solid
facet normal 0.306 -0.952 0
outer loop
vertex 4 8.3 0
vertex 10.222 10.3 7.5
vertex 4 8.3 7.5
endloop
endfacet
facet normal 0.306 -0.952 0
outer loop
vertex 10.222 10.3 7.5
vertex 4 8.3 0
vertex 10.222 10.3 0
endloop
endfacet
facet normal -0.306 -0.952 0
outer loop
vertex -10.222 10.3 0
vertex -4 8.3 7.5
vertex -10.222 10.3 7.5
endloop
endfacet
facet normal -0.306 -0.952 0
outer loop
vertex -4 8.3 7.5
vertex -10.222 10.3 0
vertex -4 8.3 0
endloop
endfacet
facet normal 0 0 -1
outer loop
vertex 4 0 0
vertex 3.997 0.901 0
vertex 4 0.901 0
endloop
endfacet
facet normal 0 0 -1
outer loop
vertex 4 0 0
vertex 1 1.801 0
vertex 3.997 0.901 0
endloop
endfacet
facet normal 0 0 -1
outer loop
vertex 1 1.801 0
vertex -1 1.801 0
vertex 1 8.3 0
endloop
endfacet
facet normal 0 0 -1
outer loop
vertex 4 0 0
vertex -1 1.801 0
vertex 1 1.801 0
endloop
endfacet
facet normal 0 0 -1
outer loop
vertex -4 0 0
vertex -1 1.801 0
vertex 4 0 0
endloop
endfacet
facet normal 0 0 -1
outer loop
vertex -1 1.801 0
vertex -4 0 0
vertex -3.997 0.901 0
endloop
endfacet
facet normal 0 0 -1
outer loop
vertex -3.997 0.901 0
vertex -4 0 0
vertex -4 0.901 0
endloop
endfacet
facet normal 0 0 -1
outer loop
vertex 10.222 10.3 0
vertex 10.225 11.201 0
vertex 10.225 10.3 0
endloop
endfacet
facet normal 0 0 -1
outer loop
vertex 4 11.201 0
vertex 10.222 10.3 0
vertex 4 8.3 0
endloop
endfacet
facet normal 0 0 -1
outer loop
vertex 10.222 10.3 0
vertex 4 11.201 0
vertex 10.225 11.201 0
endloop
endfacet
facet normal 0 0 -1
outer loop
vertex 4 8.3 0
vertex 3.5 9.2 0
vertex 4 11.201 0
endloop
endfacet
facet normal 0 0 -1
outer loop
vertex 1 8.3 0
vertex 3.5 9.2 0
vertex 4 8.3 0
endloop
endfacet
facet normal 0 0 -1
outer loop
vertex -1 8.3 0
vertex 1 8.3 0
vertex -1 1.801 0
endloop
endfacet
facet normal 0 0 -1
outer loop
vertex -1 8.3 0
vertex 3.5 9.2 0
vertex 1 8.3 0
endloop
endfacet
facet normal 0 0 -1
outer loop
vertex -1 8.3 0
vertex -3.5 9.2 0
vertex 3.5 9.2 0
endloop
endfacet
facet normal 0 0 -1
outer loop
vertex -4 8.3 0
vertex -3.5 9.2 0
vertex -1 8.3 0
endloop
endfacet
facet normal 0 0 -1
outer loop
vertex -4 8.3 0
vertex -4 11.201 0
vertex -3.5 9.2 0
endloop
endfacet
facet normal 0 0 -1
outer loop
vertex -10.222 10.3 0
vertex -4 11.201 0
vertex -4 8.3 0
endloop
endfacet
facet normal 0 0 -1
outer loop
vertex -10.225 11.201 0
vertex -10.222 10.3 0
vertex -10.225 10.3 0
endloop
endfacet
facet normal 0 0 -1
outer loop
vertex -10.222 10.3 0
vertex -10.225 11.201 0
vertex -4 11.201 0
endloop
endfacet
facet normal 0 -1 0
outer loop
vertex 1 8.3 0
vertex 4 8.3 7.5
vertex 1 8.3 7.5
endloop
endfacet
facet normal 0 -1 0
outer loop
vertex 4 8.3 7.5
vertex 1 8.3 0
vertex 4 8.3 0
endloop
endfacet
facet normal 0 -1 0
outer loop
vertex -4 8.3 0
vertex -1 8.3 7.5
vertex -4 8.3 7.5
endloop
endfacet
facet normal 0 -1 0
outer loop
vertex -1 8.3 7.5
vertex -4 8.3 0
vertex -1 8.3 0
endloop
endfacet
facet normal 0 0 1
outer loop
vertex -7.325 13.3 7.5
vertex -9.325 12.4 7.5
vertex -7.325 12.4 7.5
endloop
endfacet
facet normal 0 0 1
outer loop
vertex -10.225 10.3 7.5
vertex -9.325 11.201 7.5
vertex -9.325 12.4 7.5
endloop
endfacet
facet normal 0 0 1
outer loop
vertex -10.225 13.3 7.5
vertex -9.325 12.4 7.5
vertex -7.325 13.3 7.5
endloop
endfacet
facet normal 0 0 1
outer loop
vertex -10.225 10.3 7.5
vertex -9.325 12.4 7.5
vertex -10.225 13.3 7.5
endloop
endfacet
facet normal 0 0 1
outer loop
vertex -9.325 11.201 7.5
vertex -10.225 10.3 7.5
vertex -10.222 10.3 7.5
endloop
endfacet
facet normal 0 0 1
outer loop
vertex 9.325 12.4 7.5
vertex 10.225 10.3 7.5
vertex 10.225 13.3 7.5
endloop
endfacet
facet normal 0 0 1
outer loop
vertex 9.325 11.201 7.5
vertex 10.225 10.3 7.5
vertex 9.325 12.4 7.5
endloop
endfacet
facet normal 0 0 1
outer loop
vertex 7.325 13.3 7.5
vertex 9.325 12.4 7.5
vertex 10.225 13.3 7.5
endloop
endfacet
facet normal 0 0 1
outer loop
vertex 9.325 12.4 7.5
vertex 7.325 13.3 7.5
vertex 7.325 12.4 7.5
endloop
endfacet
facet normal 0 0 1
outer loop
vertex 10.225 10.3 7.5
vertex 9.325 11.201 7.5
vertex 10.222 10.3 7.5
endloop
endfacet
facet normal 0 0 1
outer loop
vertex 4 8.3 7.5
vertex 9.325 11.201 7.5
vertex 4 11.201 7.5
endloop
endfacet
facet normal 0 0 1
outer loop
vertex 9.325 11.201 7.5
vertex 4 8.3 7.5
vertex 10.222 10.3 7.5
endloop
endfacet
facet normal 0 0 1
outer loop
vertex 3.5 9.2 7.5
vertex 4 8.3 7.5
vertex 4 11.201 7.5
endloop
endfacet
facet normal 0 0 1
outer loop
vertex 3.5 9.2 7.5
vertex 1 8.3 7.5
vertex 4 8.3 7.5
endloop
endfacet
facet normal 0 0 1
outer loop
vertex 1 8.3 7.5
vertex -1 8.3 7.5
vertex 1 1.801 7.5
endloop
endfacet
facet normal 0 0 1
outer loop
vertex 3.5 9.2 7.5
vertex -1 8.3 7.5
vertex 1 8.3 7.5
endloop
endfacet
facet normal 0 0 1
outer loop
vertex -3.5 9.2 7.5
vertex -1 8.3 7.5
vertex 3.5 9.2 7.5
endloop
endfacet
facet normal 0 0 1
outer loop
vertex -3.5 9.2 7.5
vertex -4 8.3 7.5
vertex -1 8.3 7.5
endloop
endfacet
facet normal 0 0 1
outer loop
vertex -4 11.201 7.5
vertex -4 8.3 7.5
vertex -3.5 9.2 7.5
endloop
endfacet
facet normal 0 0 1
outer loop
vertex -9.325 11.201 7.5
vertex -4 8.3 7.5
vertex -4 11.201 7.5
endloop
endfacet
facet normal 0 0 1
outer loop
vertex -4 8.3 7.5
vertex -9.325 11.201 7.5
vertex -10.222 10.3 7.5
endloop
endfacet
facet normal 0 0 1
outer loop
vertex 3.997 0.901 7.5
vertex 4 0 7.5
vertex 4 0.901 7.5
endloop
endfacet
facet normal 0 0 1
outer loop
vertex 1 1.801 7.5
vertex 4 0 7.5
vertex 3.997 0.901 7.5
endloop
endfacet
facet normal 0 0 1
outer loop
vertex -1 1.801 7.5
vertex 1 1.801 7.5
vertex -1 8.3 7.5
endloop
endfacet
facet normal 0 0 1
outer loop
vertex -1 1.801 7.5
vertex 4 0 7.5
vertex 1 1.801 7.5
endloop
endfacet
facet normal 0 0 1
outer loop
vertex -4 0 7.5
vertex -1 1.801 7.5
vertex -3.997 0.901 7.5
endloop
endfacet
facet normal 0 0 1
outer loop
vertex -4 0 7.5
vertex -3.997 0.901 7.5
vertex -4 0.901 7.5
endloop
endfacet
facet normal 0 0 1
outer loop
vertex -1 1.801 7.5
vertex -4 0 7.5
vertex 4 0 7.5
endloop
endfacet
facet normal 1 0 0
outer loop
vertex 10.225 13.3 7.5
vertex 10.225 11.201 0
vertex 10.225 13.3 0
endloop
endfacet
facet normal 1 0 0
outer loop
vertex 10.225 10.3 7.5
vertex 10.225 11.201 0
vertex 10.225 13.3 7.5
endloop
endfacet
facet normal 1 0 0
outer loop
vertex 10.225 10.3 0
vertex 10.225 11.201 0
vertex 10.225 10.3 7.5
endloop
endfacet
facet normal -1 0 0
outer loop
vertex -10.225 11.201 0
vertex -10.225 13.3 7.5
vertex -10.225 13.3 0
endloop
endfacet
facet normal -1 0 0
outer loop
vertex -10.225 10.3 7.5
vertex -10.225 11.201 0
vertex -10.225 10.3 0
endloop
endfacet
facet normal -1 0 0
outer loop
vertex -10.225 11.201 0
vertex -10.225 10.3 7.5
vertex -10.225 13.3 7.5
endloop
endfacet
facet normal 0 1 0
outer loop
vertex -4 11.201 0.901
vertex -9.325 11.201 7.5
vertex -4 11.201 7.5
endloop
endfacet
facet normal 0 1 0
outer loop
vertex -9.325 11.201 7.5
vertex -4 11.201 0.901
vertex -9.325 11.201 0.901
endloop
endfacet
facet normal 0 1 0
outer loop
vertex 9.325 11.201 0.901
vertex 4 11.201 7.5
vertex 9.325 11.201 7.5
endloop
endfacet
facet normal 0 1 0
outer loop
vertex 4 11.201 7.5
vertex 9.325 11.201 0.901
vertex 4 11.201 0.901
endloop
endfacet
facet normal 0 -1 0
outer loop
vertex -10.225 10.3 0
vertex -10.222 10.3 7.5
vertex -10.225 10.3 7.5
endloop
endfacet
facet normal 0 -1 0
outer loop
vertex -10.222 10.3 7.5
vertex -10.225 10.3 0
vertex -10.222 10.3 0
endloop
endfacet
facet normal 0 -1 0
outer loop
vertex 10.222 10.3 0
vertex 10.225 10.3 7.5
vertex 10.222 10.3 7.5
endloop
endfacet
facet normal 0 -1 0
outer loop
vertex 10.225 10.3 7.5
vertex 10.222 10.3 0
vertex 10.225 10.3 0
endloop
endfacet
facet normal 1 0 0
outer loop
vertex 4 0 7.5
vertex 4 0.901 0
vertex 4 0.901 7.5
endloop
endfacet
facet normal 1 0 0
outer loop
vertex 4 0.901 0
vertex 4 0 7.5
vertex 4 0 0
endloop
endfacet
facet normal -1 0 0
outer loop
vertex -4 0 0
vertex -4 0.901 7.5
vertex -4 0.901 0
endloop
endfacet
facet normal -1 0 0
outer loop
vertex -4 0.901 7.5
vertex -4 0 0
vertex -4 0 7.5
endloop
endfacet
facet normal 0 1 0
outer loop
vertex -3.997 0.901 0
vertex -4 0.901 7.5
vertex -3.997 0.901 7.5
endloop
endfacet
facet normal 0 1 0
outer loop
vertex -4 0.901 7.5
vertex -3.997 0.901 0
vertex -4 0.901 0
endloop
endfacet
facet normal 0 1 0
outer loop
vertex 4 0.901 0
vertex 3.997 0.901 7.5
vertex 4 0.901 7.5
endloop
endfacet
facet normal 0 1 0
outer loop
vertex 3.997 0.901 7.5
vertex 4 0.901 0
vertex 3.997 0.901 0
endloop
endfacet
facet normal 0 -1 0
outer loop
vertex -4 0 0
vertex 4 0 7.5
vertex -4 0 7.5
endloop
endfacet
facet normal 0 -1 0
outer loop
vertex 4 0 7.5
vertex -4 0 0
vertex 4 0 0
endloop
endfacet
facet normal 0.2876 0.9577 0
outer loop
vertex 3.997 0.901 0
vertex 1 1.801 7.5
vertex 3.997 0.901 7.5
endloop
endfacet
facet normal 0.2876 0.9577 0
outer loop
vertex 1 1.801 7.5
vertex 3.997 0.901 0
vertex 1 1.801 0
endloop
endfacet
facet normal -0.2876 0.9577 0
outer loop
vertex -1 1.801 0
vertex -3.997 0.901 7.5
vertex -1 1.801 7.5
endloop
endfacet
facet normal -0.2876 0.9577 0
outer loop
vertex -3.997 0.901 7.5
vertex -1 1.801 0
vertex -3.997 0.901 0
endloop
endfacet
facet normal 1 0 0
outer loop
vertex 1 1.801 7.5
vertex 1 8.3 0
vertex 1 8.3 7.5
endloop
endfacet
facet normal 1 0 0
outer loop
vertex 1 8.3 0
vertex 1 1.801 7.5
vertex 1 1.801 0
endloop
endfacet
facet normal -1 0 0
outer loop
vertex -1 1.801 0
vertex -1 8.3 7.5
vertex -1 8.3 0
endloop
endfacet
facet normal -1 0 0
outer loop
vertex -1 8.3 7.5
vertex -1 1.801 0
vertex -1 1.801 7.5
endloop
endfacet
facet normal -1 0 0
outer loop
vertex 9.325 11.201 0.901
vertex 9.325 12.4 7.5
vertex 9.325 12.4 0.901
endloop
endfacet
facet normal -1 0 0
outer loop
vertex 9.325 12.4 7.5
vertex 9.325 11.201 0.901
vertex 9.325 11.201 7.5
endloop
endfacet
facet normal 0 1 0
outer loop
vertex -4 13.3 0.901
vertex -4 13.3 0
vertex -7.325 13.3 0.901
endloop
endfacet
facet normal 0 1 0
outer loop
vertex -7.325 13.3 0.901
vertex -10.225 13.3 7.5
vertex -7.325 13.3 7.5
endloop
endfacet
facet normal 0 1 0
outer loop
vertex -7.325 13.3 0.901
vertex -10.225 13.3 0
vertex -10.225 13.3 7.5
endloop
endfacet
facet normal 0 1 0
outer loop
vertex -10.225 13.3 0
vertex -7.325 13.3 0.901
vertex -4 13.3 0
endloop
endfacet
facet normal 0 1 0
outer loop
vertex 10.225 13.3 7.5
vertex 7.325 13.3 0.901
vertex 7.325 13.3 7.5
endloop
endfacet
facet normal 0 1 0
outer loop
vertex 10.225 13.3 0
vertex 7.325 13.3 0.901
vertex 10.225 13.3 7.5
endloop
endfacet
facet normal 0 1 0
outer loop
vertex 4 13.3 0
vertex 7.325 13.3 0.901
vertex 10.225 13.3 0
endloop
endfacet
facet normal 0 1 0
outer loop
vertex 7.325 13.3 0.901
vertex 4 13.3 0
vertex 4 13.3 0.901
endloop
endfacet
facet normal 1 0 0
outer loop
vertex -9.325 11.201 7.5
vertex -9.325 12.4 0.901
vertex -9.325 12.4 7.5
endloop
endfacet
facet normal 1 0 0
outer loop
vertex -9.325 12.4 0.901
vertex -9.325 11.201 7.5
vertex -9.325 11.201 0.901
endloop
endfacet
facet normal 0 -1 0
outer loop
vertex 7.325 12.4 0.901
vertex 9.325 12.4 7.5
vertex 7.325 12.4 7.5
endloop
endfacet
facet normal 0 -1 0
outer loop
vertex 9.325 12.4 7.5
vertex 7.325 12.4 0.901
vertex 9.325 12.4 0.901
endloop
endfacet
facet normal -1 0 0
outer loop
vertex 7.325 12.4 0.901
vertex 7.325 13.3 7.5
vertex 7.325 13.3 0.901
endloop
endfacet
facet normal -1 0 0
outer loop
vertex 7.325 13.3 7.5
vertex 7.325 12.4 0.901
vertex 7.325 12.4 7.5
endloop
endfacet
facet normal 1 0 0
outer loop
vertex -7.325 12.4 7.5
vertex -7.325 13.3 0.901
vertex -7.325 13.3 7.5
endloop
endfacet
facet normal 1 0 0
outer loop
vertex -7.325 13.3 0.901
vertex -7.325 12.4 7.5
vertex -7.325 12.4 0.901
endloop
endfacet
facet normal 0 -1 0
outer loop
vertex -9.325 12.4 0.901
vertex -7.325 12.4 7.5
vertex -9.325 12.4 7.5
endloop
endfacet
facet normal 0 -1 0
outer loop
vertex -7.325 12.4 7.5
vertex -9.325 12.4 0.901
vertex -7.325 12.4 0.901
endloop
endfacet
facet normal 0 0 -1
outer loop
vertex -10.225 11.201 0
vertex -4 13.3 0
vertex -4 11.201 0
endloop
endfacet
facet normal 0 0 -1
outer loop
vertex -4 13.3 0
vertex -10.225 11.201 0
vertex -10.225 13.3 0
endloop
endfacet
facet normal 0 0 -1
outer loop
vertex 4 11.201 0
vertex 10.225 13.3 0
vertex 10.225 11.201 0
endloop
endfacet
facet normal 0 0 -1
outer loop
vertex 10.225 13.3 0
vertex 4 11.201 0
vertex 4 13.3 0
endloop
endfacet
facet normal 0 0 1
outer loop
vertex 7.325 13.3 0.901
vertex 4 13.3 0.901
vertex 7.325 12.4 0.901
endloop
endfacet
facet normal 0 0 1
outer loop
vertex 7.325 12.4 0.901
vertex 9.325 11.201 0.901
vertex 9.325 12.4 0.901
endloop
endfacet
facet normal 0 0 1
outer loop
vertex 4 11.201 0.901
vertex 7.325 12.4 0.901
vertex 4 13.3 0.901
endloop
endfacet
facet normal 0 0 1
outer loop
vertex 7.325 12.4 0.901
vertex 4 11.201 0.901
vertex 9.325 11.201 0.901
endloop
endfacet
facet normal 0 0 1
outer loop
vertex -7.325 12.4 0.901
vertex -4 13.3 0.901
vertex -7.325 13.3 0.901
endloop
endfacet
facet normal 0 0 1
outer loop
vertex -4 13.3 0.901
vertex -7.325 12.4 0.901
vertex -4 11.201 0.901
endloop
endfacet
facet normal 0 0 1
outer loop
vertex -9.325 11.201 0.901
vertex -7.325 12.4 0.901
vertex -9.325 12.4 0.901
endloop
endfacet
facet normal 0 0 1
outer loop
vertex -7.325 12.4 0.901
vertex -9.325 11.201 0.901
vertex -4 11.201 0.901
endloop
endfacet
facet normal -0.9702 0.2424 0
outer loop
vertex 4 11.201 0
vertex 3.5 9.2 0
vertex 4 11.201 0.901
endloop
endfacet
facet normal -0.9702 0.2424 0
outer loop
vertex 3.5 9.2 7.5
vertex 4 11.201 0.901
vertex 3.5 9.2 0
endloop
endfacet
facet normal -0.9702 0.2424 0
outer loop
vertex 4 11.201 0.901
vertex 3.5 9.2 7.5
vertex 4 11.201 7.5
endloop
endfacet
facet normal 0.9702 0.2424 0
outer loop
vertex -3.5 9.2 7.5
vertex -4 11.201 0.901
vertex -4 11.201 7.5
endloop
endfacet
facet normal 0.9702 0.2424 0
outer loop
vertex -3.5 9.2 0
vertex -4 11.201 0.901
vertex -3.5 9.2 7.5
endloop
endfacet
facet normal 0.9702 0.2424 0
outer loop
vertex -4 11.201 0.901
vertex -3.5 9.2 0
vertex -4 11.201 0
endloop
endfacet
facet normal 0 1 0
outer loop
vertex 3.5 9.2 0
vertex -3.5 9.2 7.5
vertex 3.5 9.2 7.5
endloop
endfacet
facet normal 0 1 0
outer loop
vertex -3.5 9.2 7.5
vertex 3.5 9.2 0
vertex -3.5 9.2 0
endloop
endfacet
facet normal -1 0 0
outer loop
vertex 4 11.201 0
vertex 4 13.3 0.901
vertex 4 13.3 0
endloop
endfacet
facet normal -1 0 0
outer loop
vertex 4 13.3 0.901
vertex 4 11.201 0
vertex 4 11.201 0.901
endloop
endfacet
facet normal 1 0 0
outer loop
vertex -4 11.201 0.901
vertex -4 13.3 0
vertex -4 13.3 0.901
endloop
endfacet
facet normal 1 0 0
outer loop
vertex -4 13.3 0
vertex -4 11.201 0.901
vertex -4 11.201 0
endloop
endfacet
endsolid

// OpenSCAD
overlap = 0.001;

depth = 7.5;
thickness = 0.9;
innerDepth = depth - thickness;

// Space allowed for the rf board
board_width = 18.65;
board_height = 1.2;
// Space allowed for plug on the rf board
plug_opening_width_top = 8;
plug_opening_width_bottom = 7;
plug_opening_height = 2;
// Part enclosing top of rf board
board_top_width = 2;
board_top_height = thickness;

// Total height of base from bottom of rf board to ground
base_height = 11.2;

// Top of the base below the rf board
base_top_height_outside = thickness;
base_top_height_inside = plug_opening_height + thickness;
base_top_width_top = board_width + 2 * thickness;
base_top_width_bottom = 8;

// Bottom of the base on the ground
base_bottom_height_outside = thickness;
base_bottom_height_inside = thickness * 2;
base_bottom_width_bottom = 8;
base_bottom_width_top = 2;

module trapezoid(a, b, h, d) {
    linear_extrude(d, convexity = 2)
        polygon([
            [-b / 2, 0],
            [b / 2, 0],
            [a / 2, h],
            [-a / 2, h]
        ]);
}


translate([0, 0, depth])
mirror([0, 0, 1])
difference() {
    union() {
        // Base bottom
        translate([-base_bottom_width_bottom / 2, 0])
            cube([base_bottom_width_bottom, base_bottom_height_outside + overlap, depth]);
        translate([0, base_bottom_height_outside])
            trapezoid(
                base_bottom_width_top,
                base_bottom_width_bottom,
                base_bottom_height_inside - base_bottom_height_outside + overlap,
                depth
            );
        // Base middle
        translate([-base_bottom_width_top / 2, base_bottom_height_inside])
            cube([base_bottom_width_top, base_height - base_bottom_height_inside - base_top_height_inside + overlap, depth]);
        // Base top
        union() {
            translate([0, base_height - base_top_height_outside + overlap])
                mirror([0, 1, 0]) // top edge on origin
                trapezoid(
                    base_top_width_bottom,
                    base_top_width_top,
                    base_top_height_inside - base_top_height_outside + overlap,
                    depth
                );
            translate([-base_top_width_top / 2, base_height + overlap])
                mirror([0, 1, 0]) // top edge on origin
                cube([base_top_width_top, base_top_height_outside + overlap, depth]);
        }
        // Rf board sides
        translate([board_width / 2, base_height])
            cube([(base_top_width_top - board_width) / 2, board_height + board_top_height, innerDepth]);
        translate([-board_width / 2, base_height])
            mirror([1, 0, 0]) // right edge on origin
            cube([(base_top_width_top - board_width) / 2, board_height + board_top_height, innerDepth]);
        // Above rf board
        translate([board_width / 2 + overlap, base_height + board_height])
            mirror([1, 0, 0]) // right edge on origin
            cube([board_top_width + overlap, board_top_height, innerDepth]);
        translate([-board_width / 2 - overlap, base_height + board_height])
            cube([board_top_width + overlap, board_top_height, innerDepth]);
        // Cover
        translate([-base_top_width_top / 2, base_height, innerDepth - overlap])
            // mirror([0, 1, 0]) // top edge on origin
            cube([
                base_top_width_top,
                board_height + board_top_height,
                thickness + overlap
            ]);
    }
    // Space for plug
    translate([0, base_height + overlap])
        mirror([0, 1, 0]) // top edge on origin
        trapezoid(
            plug_opening_width_bottom,
            plug_opening_width_top,
            plug_opening_height + overlap,
            depth
        );
    translate([-plug_opening_width_top / 2, base_height + overlap])
        cube([plug_opening_width_top, board_height + thickness, depth]);
}
